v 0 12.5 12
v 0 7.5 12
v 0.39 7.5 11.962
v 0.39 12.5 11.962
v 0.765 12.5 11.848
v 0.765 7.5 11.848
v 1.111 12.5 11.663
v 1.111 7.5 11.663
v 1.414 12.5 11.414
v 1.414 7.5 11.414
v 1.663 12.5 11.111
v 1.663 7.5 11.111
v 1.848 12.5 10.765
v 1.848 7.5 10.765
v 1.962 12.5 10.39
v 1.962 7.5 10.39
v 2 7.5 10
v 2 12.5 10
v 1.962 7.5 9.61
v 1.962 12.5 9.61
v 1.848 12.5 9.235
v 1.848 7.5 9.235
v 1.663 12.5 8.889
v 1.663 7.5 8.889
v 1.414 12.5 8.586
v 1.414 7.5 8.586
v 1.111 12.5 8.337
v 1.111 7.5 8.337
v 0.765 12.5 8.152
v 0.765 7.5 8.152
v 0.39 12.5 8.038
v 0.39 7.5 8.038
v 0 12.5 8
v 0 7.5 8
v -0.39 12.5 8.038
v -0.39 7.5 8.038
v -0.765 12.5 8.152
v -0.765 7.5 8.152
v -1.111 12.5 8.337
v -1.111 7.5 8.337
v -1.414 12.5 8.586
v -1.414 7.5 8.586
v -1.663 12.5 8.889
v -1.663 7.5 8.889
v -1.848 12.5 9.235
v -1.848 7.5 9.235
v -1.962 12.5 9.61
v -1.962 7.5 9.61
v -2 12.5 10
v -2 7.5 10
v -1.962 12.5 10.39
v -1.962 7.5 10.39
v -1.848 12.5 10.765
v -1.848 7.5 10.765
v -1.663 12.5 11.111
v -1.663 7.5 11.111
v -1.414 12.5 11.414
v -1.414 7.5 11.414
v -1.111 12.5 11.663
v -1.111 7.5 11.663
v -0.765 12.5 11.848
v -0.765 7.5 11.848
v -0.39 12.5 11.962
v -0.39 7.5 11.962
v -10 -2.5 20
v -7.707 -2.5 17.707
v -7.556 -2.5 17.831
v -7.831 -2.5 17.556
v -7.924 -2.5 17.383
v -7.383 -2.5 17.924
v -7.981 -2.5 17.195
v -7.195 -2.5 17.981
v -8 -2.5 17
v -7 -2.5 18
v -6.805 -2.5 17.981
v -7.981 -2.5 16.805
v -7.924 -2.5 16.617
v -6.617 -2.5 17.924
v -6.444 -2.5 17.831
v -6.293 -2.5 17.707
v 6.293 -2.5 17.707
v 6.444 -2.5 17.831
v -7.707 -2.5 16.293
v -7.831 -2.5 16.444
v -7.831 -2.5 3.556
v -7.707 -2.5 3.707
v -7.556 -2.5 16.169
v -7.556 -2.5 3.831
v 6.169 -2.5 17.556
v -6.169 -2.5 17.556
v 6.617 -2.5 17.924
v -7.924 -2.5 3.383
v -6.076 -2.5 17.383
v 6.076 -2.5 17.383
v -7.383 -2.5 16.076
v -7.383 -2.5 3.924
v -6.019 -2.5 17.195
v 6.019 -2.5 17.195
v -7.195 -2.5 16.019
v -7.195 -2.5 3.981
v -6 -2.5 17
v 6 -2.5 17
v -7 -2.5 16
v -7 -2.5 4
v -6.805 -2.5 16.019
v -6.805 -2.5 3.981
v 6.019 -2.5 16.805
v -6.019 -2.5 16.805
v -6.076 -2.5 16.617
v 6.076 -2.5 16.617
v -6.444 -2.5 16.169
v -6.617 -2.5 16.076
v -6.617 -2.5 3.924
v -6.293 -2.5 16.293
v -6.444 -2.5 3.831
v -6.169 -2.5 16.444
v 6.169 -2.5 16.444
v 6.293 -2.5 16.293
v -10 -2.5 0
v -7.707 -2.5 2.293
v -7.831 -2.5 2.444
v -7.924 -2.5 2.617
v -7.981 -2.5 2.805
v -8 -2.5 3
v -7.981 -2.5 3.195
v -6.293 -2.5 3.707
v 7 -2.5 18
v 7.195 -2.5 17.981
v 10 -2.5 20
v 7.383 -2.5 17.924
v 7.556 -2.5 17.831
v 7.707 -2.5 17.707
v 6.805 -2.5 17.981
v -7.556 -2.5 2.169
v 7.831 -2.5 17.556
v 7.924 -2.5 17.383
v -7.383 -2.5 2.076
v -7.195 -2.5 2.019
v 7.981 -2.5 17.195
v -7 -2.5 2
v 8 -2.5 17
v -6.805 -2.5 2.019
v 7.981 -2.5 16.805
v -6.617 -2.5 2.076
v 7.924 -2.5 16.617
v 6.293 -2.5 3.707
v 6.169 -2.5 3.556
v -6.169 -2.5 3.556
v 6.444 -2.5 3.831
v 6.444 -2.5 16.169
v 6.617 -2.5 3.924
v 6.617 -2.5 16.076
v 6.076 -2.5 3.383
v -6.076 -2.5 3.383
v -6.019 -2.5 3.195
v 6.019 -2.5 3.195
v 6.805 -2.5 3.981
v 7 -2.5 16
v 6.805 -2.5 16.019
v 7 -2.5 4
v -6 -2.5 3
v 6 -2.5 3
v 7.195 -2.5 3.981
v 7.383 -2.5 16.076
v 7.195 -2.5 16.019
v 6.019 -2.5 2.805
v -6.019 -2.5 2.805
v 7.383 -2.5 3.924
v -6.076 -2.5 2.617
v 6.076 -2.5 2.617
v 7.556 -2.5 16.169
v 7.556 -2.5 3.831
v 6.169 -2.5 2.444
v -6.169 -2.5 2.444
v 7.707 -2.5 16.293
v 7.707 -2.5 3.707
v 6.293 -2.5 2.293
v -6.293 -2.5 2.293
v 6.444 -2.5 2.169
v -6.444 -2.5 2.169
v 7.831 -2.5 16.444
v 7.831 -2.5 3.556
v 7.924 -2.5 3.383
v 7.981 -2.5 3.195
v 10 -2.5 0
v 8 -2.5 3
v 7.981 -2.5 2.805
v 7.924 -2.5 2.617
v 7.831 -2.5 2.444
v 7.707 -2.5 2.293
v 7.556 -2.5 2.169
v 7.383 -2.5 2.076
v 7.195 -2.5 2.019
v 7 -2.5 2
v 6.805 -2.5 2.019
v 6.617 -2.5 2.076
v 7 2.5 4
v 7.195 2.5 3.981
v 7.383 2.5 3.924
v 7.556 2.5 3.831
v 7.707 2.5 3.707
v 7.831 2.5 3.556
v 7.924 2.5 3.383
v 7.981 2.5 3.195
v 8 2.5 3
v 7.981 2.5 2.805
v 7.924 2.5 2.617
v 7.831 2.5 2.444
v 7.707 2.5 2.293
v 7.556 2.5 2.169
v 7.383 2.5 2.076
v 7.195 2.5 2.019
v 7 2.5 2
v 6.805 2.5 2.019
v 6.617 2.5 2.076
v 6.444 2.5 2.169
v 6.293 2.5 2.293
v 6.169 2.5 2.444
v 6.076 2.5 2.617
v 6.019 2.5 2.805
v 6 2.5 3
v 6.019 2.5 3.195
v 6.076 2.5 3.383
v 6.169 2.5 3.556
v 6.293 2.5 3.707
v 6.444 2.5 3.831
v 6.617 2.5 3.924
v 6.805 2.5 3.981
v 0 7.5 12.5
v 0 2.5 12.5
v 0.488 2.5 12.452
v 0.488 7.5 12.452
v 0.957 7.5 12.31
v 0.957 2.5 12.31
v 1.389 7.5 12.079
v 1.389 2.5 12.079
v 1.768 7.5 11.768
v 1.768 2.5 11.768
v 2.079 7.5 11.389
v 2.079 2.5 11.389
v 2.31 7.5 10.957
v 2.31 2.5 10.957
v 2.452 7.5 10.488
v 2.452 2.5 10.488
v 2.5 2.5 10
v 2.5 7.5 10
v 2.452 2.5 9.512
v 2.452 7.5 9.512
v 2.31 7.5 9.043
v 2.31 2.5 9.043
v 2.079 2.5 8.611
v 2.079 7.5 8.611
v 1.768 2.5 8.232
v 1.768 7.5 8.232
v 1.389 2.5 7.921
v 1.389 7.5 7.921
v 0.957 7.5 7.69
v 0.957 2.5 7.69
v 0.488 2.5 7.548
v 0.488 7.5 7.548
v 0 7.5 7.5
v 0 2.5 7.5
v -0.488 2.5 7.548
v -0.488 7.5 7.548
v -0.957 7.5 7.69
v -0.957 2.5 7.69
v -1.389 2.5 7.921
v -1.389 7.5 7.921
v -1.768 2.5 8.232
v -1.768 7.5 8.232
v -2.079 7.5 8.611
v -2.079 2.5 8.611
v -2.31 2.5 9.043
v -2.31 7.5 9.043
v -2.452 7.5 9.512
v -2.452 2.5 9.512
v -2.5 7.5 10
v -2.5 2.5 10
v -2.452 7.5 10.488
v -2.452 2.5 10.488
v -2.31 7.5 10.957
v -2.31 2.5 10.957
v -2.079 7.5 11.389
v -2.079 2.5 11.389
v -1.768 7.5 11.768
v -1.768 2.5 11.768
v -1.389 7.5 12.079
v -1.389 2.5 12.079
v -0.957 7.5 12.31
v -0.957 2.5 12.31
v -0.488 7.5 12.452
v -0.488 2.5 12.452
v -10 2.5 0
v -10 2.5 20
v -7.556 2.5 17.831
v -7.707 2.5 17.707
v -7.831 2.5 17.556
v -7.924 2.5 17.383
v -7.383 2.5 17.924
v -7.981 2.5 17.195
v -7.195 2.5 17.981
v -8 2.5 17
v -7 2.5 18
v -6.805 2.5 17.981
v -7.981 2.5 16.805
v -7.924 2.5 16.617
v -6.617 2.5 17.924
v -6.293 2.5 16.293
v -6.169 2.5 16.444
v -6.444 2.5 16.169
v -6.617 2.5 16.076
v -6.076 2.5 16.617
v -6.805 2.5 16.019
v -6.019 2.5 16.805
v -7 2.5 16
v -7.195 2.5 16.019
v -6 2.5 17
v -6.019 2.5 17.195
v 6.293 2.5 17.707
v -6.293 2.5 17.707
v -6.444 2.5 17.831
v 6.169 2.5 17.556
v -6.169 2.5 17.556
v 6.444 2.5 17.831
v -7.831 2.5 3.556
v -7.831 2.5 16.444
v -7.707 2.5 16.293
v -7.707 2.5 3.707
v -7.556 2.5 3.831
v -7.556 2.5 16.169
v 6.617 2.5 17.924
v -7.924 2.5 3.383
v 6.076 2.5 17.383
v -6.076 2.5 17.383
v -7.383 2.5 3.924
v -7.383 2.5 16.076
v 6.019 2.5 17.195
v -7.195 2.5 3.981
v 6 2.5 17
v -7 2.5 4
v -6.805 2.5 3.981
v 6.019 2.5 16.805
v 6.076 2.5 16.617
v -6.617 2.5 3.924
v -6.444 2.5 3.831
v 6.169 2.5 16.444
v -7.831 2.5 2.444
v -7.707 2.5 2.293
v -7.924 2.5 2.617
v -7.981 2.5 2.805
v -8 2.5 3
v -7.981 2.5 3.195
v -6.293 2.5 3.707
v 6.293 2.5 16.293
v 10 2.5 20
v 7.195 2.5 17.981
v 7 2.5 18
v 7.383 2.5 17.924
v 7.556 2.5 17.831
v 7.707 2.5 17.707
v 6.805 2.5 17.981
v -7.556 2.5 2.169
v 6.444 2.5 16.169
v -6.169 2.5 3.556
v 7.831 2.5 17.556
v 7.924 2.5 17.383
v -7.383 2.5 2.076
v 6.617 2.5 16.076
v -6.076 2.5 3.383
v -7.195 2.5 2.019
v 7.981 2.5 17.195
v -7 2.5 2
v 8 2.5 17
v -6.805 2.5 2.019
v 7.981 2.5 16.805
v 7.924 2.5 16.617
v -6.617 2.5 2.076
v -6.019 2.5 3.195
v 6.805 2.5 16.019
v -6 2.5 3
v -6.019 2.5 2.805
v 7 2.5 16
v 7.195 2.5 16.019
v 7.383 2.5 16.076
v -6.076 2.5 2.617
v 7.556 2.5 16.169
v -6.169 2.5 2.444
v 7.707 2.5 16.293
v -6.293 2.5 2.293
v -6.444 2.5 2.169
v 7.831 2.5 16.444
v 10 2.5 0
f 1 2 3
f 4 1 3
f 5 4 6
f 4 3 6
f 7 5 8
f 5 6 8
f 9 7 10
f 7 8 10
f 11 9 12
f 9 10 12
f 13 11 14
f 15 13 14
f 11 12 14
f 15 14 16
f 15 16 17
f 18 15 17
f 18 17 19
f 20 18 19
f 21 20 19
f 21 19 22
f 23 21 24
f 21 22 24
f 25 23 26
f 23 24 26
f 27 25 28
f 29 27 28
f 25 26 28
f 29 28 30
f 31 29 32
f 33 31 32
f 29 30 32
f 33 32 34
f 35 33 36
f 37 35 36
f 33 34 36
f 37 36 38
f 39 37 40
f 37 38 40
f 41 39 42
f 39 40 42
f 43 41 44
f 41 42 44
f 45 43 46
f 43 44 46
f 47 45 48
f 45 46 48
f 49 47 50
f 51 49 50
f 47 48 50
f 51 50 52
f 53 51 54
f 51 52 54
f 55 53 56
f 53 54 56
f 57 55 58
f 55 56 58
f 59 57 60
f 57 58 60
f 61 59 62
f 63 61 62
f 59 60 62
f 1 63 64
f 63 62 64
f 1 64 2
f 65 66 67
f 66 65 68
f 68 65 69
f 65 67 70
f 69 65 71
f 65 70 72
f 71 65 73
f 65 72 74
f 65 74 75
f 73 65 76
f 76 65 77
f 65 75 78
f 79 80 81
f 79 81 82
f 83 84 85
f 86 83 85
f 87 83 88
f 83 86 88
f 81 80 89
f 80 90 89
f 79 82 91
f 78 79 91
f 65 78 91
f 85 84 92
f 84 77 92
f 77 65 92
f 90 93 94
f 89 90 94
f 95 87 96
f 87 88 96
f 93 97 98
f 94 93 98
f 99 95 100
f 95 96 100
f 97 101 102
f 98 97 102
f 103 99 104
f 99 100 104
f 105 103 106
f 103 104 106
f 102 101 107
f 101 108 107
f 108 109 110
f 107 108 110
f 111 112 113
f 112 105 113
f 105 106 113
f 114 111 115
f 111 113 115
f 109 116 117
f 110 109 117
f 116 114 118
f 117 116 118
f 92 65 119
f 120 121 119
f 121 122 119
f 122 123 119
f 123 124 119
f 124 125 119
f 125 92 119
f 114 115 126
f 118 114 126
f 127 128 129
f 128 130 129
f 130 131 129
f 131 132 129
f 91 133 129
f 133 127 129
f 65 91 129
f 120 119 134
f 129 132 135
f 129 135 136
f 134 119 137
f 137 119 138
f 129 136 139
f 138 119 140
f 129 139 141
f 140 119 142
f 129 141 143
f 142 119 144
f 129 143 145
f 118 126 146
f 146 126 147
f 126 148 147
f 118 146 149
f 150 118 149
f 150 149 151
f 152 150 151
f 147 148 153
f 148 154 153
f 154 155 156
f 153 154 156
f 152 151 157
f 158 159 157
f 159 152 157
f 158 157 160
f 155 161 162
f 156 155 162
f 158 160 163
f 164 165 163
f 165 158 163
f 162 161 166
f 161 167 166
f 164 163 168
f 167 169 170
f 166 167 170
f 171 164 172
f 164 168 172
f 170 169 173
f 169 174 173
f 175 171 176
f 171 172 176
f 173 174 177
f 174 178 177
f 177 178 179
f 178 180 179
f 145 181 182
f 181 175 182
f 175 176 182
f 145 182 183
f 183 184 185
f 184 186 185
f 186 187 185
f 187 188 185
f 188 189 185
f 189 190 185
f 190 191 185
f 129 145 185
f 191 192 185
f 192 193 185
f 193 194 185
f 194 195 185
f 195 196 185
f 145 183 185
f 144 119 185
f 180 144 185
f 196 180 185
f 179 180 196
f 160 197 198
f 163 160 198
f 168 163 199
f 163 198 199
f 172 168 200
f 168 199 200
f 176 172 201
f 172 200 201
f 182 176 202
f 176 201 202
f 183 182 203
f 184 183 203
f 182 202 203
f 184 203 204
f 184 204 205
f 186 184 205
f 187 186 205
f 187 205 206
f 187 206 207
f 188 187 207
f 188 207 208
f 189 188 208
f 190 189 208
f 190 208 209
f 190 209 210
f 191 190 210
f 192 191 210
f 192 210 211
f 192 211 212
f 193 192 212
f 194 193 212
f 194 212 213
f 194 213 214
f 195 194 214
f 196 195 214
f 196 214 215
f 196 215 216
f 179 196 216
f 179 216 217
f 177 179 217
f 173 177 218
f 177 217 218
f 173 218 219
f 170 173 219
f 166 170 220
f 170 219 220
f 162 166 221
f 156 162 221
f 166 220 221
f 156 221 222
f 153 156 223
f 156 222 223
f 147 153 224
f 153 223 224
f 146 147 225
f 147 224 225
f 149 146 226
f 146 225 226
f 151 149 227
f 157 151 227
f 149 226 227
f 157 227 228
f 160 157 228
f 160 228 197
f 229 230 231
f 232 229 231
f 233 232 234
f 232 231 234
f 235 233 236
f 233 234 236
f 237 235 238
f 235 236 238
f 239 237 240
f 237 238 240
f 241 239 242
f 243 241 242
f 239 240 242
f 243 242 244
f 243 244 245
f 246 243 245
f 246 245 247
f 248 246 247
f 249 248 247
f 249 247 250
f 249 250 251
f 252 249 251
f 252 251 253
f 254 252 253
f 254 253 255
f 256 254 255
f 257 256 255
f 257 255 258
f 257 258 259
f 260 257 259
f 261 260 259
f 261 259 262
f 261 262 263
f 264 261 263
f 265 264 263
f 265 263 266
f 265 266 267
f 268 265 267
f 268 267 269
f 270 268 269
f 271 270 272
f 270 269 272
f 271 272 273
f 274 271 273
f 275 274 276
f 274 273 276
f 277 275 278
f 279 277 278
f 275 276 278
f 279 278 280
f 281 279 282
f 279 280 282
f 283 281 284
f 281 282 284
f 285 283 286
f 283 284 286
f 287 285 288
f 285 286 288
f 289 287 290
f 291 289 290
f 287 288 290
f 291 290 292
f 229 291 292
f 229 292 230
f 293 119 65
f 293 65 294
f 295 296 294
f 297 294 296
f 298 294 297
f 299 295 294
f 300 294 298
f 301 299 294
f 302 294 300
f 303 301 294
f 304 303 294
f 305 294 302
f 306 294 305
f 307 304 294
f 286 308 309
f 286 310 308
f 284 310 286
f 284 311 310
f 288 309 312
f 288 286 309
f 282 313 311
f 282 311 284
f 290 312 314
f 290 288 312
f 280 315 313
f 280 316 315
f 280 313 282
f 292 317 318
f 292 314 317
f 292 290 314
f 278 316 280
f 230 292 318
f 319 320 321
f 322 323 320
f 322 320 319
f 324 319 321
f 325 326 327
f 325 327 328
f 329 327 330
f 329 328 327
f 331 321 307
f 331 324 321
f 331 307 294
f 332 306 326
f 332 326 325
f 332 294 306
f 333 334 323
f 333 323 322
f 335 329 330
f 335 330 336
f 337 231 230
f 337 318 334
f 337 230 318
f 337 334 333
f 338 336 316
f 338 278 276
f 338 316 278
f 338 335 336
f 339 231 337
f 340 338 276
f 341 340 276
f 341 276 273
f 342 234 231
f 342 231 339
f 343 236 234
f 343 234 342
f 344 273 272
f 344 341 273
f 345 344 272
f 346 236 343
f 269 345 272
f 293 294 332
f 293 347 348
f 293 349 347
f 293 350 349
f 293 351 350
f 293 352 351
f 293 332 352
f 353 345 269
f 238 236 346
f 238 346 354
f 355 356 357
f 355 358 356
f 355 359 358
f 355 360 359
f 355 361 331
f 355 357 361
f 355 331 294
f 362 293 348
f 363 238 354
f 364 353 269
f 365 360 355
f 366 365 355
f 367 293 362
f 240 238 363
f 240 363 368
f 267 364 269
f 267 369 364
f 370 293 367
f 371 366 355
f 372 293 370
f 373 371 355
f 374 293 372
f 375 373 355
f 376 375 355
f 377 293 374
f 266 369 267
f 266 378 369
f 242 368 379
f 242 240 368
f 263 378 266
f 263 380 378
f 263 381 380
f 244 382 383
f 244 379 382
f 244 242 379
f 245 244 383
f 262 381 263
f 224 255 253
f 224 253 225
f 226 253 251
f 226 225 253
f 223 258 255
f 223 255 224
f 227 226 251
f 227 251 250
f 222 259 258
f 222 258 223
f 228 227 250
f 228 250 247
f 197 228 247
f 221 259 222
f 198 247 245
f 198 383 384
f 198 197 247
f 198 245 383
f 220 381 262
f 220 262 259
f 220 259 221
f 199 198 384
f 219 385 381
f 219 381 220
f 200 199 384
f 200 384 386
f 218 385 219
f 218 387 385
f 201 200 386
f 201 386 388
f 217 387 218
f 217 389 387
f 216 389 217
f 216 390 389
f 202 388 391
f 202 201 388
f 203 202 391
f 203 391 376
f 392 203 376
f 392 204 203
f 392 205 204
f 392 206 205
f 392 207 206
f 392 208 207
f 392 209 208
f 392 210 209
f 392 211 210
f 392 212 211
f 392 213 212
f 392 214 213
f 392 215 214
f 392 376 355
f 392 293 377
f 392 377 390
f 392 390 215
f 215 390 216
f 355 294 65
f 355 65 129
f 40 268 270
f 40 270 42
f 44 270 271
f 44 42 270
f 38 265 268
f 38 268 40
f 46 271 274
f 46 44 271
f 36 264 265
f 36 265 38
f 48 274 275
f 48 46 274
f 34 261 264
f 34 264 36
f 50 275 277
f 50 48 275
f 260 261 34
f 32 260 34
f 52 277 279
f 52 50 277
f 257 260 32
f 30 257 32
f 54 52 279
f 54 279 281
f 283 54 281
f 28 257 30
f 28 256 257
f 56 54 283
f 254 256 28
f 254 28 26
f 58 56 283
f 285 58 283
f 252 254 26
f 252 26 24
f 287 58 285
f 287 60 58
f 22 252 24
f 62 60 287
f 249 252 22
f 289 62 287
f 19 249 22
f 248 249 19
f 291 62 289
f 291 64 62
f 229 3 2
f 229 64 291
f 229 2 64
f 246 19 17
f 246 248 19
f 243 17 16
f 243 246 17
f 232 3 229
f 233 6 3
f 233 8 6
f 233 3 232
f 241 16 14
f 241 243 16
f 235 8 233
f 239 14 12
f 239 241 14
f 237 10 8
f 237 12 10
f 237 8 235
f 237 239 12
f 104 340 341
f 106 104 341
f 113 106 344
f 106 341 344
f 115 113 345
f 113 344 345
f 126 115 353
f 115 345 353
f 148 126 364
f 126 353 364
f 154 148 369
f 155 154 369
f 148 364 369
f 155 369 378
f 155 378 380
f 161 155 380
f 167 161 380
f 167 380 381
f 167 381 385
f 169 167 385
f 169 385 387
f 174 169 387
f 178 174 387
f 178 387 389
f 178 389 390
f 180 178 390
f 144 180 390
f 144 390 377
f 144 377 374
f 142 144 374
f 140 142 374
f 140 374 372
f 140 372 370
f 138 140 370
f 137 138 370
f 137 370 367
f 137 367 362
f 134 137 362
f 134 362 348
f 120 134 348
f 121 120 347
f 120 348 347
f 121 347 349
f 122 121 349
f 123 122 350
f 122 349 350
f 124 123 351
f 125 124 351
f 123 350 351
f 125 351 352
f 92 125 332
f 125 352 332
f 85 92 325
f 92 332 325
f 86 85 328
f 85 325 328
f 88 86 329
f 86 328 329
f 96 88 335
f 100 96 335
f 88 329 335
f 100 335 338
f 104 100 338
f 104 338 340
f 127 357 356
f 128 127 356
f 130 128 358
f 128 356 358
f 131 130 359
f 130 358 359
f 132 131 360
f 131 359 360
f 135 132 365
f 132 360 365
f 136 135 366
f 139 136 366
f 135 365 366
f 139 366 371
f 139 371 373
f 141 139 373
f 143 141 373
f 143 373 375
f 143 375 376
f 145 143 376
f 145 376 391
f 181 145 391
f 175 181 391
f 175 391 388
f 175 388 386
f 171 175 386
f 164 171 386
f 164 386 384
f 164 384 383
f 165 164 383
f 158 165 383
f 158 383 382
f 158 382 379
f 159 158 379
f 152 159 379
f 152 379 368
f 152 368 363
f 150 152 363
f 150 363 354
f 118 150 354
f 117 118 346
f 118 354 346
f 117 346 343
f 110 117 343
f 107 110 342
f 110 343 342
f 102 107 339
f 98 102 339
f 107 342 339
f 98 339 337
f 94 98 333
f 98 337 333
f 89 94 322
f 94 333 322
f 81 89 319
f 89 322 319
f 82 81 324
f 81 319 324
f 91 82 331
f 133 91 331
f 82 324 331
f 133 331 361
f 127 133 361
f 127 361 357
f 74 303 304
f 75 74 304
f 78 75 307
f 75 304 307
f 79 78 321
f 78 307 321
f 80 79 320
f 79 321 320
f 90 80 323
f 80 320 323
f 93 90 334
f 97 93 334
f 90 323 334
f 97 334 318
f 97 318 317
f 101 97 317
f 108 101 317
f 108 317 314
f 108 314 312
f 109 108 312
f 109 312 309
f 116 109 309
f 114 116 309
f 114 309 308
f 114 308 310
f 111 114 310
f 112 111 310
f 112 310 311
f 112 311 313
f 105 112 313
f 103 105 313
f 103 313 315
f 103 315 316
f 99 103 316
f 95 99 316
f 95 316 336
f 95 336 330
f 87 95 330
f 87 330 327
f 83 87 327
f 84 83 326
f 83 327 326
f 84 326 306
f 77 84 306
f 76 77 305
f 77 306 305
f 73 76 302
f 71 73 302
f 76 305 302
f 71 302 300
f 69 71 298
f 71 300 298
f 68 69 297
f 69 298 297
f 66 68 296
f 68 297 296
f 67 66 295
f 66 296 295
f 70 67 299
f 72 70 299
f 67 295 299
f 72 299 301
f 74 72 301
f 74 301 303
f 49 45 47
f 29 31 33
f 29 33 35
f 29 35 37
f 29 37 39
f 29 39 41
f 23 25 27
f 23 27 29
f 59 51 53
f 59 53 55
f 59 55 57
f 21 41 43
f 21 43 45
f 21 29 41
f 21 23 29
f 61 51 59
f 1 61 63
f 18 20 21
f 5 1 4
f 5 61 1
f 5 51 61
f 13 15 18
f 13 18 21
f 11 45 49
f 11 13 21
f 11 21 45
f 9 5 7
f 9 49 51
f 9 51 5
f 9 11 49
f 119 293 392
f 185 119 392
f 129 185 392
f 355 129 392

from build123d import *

# Parameters (mm, degrees)
SKETCH1_W           = 20
SKETCH1_H           = 5
BOSS_EXTRUDE1_DEPTH = 20
SKETCH2_R           = 2.5
BOSS_EXTRUDE2_DEPTH = 10
SKETCH3_R           = 1
CUT_EXTRUDE1_DEPTH  = 25.494897428
CUT_EXTRUDE2_START  = -5
SKETCH4_R           = 2.5
SKETCH4_R_2         = 2
CUT_EXTRUDE2_DEPTH  = 5


with BuildPart() as part:
    # Sketch1 → Boss-Extrude1 (new body)
    with BuildSketch(Plane.XY):
        Rectangle(SKETCH1_W, SKETCH1_H)
    extrude(amount=BOSS_EXTRUDE1_DEPTH)

    # Sketch2 → Boss-Extrude2 (add)
    with BuildSketch(Plane(origin=(0, 2.5, 0), x_dir=(1, 0, 0), z_dir=(0, 1, 0))):
        with Locations(Location((0, -10, 0), (0, 0, 270))):
            Circle(SKETCH2_R)
    extrude(amount=BOSS_EXTRUDE2_DEPTH)

    # Sketch3 → Cut-Extrude1 (cut, through all)
    with BuildSketch(Plane(origin=(0, 2.5, 0), x_dir=(1, 0, 0), z_dir=(0, 1, 0))):
        with Locations(Location((-7, -3, 0), (0, 0, 270))):
            Circle(SKETCH3_R)
        with Locations(Location((7, -3, 0), (0, 0, 270))):
            Circle(SKETCH3_R)
        with Locations(Location((-7, -17, 0), (0, 0, 270))):
            Circle(SKETCH3_R)
        with Locations(Location((7, -17, 0), (0, 0, 270))):
            Circle(SKETCH3_R)
    extrude(amount=-CUT_EXTRUDE1_DEPTH, mode=Mode.SUBTRACT)

    # Sketch4 → Cut-Extrude2 (cut)
    with BuildSketch(Plane(origin=(0, 12.5, 0), x_dir=(1, 0, 0), z_dir=(0, 1, 0)).offset(CUT_EXTRUDE2_START)):
        with Locations(Location((0, -10, 0), (0, 0, 270))):
            Circle(SKETCH4_R)
        with Locations(Location((0, -10, 0), (0, 0, 270))):
            Circle(SKETCH4_R_2, mode=Mode.SUBTRACT)
    extrude(amount=CUT_EXTRUDE2_DEPTH, mode=Mode.SUBTRACT)


solid = part.part
